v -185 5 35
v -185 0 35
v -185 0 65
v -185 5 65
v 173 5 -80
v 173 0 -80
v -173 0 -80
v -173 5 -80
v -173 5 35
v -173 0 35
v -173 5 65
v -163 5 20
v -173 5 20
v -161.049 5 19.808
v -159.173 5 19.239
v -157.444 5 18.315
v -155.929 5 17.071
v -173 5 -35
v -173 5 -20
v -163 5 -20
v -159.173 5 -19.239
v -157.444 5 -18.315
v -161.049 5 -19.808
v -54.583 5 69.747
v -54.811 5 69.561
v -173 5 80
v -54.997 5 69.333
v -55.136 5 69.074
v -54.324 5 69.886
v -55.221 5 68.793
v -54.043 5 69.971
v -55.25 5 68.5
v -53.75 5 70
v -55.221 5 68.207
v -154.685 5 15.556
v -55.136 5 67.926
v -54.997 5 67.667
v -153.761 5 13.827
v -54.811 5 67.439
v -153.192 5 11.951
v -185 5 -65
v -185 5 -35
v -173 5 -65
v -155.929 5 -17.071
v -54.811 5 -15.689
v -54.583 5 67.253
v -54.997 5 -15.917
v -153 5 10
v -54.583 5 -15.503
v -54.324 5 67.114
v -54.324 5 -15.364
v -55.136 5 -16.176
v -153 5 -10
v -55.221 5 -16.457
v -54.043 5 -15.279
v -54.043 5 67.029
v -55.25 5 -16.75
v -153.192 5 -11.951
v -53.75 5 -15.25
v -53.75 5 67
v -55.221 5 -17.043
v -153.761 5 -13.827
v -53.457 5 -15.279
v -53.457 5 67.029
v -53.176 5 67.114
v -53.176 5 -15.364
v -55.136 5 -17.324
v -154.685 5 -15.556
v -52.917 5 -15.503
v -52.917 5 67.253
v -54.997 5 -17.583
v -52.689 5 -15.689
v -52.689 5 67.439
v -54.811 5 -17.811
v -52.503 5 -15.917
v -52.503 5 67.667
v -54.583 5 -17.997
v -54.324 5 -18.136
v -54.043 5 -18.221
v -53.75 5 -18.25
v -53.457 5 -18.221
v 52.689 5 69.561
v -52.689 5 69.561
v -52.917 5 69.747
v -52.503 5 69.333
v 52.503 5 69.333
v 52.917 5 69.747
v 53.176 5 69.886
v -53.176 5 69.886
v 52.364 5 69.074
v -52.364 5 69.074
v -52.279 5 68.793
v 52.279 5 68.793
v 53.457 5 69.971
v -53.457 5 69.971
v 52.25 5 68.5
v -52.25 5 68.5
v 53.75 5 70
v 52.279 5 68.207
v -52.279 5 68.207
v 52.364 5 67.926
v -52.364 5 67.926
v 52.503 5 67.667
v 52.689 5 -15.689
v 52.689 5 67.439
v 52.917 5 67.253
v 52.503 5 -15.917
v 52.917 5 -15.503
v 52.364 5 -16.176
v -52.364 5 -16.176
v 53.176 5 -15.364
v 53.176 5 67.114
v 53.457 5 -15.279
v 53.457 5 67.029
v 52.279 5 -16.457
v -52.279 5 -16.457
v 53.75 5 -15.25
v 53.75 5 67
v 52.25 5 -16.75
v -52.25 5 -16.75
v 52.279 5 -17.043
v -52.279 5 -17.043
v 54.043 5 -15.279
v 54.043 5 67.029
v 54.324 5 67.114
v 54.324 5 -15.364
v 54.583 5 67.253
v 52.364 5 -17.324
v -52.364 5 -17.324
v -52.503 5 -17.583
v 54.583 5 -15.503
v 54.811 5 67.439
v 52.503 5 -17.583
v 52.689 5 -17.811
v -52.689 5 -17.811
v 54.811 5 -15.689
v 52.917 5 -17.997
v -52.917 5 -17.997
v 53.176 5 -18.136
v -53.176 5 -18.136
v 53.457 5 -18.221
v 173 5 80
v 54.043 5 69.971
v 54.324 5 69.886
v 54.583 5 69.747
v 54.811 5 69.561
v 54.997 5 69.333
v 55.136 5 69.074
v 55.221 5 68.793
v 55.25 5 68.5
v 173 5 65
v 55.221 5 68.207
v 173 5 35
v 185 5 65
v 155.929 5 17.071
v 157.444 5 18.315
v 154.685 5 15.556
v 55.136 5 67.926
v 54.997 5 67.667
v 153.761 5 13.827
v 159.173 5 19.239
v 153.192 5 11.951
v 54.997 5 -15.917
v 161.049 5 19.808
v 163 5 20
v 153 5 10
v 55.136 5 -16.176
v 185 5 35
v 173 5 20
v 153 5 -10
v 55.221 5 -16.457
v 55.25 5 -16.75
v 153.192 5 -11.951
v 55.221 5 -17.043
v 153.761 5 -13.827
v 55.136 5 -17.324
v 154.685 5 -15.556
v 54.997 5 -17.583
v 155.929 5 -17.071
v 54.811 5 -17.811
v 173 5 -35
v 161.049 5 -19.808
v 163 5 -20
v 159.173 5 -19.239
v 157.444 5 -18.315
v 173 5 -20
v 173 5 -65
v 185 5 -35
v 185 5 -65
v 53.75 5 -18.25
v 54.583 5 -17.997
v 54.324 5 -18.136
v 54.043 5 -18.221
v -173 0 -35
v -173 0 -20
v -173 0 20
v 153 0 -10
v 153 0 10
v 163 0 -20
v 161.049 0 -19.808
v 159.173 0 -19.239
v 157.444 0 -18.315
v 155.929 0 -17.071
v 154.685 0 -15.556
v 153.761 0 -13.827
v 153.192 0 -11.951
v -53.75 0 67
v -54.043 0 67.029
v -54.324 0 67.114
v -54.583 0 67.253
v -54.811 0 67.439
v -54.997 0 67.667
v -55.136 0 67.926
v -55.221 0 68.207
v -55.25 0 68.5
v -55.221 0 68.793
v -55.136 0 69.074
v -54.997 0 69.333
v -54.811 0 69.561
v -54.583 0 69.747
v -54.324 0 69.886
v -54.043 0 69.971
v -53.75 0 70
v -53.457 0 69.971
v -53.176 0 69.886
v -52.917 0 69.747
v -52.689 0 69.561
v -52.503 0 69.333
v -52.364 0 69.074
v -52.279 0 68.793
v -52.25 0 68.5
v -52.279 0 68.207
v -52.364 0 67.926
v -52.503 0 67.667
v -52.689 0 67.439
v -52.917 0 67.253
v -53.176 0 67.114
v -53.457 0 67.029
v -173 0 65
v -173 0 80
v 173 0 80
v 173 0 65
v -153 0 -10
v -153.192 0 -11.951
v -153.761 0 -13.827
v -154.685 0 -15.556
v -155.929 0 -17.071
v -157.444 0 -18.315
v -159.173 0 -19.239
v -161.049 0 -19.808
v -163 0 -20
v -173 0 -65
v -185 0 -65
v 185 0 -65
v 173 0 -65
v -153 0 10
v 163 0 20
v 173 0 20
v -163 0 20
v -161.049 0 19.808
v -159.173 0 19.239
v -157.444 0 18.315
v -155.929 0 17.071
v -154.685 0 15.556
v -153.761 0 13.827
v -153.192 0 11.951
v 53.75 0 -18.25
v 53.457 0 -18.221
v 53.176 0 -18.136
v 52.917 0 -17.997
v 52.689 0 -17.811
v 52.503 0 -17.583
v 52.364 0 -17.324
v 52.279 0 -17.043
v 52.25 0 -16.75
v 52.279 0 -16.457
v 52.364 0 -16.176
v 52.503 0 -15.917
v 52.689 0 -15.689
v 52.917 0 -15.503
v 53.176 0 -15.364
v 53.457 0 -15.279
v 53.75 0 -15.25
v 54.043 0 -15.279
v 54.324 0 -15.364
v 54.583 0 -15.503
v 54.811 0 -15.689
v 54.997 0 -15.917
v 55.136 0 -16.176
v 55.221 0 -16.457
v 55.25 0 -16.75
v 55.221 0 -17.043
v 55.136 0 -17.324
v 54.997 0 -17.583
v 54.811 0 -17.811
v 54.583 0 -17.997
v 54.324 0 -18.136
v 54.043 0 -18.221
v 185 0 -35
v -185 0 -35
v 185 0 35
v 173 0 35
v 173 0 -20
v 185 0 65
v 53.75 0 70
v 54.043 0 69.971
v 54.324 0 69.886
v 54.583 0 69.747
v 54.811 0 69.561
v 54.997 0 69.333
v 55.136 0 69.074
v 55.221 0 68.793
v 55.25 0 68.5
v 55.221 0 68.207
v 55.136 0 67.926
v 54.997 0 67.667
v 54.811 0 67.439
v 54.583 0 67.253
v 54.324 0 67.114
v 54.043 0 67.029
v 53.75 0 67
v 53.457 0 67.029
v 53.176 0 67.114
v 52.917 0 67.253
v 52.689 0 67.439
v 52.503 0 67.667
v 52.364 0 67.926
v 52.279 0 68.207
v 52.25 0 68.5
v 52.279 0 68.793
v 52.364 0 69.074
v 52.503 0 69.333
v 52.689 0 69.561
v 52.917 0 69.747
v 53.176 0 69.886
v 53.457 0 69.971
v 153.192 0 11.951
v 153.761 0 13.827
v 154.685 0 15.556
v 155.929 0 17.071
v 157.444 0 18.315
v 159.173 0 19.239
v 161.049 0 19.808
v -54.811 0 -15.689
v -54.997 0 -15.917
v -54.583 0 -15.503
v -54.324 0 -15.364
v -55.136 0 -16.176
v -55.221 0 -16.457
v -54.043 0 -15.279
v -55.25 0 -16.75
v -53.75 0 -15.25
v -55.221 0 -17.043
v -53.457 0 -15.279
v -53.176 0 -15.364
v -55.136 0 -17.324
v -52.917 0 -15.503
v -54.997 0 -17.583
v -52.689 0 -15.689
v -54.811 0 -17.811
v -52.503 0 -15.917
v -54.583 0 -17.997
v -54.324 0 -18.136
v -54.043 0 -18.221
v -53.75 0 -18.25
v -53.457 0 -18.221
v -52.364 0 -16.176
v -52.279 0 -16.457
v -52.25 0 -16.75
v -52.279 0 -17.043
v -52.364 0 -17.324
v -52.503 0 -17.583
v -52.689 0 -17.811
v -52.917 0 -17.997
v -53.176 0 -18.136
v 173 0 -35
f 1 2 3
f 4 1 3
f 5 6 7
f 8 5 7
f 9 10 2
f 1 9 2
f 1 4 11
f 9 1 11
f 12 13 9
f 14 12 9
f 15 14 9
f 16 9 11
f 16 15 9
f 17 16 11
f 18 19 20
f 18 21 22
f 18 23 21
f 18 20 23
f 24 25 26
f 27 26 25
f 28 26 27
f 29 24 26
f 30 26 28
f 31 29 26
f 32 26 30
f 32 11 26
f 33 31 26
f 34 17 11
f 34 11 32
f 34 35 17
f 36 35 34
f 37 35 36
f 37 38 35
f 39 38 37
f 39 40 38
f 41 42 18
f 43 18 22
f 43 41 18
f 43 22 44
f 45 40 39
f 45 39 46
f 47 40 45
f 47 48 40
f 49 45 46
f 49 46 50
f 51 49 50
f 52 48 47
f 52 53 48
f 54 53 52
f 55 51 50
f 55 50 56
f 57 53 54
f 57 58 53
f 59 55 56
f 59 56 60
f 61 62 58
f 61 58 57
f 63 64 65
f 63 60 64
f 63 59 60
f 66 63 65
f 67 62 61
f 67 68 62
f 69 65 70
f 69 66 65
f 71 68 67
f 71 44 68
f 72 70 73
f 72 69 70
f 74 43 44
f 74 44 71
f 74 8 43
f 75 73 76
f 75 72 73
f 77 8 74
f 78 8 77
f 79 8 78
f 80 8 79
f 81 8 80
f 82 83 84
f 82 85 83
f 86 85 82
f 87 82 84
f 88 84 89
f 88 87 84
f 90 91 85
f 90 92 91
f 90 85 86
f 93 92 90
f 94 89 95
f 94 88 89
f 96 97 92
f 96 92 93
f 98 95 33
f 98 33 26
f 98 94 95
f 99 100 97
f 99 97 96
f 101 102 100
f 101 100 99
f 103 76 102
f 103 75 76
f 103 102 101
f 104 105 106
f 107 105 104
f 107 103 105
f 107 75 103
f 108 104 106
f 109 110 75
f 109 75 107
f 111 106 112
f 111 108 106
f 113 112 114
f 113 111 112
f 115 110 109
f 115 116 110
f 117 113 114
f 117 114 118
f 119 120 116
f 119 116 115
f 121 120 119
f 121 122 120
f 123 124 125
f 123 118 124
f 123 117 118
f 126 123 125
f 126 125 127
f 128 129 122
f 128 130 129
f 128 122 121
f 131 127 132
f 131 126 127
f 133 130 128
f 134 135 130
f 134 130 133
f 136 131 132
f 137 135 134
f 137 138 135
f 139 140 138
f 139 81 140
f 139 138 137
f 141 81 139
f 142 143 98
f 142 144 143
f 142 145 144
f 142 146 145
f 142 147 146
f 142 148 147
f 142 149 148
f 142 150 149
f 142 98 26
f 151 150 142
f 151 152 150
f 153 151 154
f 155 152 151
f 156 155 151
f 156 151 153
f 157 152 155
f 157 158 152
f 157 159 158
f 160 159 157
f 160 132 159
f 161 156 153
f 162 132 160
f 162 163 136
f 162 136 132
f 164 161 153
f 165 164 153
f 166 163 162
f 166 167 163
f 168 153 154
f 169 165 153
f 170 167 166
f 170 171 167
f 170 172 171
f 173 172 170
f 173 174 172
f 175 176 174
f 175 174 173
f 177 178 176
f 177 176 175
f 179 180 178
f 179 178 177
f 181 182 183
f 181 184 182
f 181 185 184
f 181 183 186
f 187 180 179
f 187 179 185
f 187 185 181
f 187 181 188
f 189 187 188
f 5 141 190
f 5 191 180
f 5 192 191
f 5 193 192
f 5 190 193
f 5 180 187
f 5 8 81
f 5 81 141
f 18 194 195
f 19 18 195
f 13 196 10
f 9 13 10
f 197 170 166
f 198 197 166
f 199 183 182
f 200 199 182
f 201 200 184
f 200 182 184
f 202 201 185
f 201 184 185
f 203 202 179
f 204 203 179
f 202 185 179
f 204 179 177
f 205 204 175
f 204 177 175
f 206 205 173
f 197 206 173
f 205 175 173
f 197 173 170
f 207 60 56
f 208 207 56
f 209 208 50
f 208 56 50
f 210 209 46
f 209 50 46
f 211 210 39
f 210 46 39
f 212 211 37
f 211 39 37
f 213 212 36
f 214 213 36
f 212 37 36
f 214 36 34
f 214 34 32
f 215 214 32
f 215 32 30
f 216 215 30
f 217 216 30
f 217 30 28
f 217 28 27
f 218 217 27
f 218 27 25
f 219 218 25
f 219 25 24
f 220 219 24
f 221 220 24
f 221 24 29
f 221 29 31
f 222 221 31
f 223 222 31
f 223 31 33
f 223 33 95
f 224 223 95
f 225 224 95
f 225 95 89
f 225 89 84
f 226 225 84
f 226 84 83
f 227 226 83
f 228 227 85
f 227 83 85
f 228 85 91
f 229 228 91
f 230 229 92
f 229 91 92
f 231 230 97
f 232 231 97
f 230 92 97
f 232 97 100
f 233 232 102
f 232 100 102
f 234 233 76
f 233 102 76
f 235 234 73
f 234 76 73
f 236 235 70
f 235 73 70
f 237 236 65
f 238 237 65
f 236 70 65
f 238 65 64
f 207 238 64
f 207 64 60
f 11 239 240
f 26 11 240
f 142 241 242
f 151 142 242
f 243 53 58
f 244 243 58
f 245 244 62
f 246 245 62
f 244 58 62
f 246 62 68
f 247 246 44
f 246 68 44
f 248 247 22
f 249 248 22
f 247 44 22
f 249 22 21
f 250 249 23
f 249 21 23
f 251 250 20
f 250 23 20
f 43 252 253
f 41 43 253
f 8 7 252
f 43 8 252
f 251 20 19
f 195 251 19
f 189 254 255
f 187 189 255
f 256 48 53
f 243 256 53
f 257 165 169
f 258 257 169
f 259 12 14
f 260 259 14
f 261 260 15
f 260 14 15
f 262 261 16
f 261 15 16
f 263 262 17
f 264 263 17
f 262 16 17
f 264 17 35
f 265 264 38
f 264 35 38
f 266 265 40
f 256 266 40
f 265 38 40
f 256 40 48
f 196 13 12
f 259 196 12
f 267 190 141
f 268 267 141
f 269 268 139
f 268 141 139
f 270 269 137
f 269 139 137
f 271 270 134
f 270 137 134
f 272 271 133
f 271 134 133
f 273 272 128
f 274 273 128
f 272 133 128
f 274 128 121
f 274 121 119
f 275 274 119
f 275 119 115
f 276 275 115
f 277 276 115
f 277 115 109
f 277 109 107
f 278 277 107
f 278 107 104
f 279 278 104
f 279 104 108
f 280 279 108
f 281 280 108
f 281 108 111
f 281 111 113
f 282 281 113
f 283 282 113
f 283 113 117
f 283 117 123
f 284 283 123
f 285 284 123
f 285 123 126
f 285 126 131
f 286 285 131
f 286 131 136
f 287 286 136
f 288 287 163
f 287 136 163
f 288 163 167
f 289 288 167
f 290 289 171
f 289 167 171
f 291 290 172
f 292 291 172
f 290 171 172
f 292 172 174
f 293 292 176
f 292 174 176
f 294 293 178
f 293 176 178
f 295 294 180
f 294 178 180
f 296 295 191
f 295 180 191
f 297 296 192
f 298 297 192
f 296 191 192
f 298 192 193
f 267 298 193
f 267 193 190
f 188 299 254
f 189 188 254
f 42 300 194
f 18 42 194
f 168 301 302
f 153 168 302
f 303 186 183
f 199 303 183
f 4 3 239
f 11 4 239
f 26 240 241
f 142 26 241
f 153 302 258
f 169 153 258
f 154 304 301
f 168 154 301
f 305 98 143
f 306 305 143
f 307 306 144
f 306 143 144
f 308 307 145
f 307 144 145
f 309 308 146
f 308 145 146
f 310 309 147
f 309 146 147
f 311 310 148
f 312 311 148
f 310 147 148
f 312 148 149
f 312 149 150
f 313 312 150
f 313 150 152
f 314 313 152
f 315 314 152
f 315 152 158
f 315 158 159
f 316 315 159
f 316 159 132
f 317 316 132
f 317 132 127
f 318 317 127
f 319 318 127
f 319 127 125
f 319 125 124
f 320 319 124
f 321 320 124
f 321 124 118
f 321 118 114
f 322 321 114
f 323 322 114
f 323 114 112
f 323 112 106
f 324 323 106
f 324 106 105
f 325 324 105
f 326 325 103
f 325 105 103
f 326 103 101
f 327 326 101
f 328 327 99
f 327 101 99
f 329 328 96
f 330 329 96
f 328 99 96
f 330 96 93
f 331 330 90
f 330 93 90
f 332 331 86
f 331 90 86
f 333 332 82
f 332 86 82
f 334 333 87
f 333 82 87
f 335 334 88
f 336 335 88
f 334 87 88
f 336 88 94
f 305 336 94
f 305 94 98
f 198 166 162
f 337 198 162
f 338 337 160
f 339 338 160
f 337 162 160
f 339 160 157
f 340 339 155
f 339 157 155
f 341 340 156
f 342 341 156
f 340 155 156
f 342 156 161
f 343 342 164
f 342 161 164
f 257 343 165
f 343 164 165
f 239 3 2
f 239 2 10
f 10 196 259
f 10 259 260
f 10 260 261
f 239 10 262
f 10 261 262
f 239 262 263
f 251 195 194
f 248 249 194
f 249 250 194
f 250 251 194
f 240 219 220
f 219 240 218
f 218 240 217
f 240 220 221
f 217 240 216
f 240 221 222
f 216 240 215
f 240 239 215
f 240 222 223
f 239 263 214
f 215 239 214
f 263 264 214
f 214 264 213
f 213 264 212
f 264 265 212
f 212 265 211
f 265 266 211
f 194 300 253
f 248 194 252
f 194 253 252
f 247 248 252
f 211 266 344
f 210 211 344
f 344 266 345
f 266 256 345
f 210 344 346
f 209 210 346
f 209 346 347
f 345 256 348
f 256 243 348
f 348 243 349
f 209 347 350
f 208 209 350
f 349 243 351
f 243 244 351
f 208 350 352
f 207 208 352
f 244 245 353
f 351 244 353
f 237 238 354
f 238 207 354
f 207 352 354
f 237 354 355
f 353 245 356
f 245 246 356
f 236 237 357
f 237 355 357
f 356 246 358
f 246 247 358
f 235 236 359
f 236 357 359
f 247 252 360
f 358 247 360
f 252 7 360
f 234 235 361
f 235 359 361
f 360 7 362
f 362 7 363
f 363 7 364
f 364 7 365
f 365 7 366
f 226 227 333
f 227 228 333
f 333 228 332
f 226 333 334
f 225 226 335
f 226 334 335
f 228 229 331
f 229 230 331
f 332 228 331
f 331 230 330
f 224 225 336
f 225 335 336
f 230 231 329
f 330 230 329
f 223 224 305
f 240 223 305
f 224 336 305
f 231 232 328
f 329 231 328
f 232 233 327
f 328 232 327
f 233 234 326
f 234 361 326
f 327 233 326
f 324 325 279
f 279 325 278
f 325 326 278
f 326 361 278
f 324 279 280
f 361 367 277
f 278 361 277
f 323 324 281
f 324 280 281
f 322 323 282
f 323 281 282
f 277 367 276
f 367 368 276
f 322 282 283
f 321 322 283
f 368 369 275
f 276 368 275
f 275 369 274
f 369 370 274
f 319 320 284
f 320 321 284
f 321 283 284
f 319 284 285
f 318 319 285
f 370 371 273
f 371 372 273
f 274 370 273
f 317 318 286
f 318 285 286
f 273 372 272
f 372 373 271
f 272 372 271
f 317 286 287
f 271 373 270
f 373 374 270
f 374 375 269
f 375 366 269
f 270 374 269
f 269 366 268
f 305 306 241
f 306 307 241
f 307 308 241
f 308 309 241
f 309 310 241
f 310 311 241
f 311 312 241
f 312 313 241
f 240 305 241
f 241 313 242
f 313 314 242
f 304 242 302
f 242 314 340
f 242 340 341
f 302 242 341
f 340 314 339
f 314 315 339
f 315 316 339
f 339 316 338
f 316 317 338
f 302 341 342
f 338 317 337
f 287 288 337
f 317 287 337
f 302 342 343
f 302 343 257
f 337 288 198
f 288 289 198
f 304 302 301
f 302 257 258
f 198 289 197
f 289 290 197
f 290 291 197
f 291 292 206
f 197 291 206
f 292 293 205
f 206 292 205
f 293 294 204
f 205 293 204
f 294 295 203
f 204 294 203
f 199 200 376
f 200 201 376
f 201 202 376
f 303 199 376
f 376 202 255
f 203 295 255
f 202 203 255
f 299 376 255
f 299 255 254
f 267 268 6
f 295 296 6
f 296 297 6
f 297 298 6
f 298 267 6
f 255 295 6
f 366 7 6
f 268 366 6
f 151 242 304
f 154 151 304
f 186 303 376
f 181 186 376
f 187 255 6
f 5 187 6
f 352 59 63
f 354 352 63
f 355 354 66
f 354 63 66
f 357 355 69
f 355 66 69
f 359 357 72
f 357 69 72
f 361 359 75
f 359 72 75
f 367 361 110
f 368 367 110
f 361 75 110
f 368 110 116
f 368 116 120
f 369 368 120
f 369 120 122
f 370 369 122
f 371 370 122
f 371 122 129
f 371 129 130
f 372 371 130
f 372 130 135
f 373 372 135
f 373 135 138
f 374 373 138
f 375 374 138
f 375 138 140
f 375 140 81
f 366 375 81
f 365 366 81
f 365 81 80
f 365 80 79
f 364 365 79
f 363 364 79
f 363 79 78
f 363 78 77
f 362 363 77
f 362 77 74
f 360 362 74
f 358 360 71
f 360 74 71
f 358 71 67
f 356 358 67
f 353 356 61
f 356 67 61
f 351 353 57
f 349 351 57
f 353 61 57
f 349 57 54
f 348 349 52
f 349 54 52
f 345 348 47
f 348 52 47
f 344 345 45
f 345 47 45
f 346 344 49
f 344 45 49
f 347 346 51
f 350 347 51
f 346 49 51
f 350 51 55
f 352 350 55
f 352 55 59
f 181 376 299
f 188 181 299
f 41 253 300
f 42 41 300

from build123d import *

# Parameters (mm, degrees)
EXTRUDE_1_DEPTH     = 5
SKETCH_2_R          = 1.5
CUT_EXTRUDE_1_DEPTH = 202.618451537


with BuildPart() as part:
    # 草圖1 → 填料-伸長1 (new body)
    with BuildSketch(Plane(origin=(0, 0, 0), x_dir=(1, 0, 0), z_dir=(0, 1, 0))):
        Polygon((173, -65), (185, -65), (185, -35), (173, -35), (173, 35), (185, 35), (185, 65), (173, 65), (173, 80), (-173, 80), (-173, 65), (-185, 65), (-185, 35), (-173, 35), (-173, -35), (-185, -35), (-185, -65), (-173, -65), (-173, -80), (173, -80), align=None)
    extrude(amount=EXTRUDE_1_DEPTH)

    # 草圖2 → 除料-伸長1 (cut, through all)
    with BuildSketch(Plane(origin=(0, 5, 0), x_dir=(1, 0, 0), z_dir=(0, 1, 0))):
        with Locations(Location((-53.75, 16.75, 0), (0, 0, 270))):
            Circle(SKETCH_2_R)
        with Locations(Location((53.75, 16.75, 0), (0, 0, 90))):
            Circle(SKETCH_2_R)
        with Locations(Location((53.75, -68.5, 0), (0, 0, 270))):
            Circle(SKETCH_2_R)
        with Locations(Location((-53.75, -68.5, 0), (0, 0, 90))):
            Circle(SKETCH_2_R)
        with BuildLine():
            Line((-173, -20), (-163, -20))
            ThreePointArc((-163, -20), (-155.928932188, -17.071067812), (-153, -10))
            Line((-153, -10), (-153, 10))
            ThreePointArc((-153, 10), (-155.928932188, 17.071067812), (-163, 20))
            Line((-163, 20), (-173, 20))
            Line((-173, 20), (-173, -20))
        make_face()
        with BuildLine():
            Line((173, 20), (163, 20))
            ThreePointArc((163, 20), (155.928932188, 17.071067812), (153, 10))
            Line((153, 10), (153, -10))
            ThreePointArc((153, -10), (155.928932188, -17.071067812), (163, -20))
            Line((163, -20), (173, -20))
            Line((173, -20), (173, 20))
        make_face()
    extrude(amount=-CUT_EXTRUDE_1_DEPTH, mode=Mode.SUBTRACT)


solid = part.part
